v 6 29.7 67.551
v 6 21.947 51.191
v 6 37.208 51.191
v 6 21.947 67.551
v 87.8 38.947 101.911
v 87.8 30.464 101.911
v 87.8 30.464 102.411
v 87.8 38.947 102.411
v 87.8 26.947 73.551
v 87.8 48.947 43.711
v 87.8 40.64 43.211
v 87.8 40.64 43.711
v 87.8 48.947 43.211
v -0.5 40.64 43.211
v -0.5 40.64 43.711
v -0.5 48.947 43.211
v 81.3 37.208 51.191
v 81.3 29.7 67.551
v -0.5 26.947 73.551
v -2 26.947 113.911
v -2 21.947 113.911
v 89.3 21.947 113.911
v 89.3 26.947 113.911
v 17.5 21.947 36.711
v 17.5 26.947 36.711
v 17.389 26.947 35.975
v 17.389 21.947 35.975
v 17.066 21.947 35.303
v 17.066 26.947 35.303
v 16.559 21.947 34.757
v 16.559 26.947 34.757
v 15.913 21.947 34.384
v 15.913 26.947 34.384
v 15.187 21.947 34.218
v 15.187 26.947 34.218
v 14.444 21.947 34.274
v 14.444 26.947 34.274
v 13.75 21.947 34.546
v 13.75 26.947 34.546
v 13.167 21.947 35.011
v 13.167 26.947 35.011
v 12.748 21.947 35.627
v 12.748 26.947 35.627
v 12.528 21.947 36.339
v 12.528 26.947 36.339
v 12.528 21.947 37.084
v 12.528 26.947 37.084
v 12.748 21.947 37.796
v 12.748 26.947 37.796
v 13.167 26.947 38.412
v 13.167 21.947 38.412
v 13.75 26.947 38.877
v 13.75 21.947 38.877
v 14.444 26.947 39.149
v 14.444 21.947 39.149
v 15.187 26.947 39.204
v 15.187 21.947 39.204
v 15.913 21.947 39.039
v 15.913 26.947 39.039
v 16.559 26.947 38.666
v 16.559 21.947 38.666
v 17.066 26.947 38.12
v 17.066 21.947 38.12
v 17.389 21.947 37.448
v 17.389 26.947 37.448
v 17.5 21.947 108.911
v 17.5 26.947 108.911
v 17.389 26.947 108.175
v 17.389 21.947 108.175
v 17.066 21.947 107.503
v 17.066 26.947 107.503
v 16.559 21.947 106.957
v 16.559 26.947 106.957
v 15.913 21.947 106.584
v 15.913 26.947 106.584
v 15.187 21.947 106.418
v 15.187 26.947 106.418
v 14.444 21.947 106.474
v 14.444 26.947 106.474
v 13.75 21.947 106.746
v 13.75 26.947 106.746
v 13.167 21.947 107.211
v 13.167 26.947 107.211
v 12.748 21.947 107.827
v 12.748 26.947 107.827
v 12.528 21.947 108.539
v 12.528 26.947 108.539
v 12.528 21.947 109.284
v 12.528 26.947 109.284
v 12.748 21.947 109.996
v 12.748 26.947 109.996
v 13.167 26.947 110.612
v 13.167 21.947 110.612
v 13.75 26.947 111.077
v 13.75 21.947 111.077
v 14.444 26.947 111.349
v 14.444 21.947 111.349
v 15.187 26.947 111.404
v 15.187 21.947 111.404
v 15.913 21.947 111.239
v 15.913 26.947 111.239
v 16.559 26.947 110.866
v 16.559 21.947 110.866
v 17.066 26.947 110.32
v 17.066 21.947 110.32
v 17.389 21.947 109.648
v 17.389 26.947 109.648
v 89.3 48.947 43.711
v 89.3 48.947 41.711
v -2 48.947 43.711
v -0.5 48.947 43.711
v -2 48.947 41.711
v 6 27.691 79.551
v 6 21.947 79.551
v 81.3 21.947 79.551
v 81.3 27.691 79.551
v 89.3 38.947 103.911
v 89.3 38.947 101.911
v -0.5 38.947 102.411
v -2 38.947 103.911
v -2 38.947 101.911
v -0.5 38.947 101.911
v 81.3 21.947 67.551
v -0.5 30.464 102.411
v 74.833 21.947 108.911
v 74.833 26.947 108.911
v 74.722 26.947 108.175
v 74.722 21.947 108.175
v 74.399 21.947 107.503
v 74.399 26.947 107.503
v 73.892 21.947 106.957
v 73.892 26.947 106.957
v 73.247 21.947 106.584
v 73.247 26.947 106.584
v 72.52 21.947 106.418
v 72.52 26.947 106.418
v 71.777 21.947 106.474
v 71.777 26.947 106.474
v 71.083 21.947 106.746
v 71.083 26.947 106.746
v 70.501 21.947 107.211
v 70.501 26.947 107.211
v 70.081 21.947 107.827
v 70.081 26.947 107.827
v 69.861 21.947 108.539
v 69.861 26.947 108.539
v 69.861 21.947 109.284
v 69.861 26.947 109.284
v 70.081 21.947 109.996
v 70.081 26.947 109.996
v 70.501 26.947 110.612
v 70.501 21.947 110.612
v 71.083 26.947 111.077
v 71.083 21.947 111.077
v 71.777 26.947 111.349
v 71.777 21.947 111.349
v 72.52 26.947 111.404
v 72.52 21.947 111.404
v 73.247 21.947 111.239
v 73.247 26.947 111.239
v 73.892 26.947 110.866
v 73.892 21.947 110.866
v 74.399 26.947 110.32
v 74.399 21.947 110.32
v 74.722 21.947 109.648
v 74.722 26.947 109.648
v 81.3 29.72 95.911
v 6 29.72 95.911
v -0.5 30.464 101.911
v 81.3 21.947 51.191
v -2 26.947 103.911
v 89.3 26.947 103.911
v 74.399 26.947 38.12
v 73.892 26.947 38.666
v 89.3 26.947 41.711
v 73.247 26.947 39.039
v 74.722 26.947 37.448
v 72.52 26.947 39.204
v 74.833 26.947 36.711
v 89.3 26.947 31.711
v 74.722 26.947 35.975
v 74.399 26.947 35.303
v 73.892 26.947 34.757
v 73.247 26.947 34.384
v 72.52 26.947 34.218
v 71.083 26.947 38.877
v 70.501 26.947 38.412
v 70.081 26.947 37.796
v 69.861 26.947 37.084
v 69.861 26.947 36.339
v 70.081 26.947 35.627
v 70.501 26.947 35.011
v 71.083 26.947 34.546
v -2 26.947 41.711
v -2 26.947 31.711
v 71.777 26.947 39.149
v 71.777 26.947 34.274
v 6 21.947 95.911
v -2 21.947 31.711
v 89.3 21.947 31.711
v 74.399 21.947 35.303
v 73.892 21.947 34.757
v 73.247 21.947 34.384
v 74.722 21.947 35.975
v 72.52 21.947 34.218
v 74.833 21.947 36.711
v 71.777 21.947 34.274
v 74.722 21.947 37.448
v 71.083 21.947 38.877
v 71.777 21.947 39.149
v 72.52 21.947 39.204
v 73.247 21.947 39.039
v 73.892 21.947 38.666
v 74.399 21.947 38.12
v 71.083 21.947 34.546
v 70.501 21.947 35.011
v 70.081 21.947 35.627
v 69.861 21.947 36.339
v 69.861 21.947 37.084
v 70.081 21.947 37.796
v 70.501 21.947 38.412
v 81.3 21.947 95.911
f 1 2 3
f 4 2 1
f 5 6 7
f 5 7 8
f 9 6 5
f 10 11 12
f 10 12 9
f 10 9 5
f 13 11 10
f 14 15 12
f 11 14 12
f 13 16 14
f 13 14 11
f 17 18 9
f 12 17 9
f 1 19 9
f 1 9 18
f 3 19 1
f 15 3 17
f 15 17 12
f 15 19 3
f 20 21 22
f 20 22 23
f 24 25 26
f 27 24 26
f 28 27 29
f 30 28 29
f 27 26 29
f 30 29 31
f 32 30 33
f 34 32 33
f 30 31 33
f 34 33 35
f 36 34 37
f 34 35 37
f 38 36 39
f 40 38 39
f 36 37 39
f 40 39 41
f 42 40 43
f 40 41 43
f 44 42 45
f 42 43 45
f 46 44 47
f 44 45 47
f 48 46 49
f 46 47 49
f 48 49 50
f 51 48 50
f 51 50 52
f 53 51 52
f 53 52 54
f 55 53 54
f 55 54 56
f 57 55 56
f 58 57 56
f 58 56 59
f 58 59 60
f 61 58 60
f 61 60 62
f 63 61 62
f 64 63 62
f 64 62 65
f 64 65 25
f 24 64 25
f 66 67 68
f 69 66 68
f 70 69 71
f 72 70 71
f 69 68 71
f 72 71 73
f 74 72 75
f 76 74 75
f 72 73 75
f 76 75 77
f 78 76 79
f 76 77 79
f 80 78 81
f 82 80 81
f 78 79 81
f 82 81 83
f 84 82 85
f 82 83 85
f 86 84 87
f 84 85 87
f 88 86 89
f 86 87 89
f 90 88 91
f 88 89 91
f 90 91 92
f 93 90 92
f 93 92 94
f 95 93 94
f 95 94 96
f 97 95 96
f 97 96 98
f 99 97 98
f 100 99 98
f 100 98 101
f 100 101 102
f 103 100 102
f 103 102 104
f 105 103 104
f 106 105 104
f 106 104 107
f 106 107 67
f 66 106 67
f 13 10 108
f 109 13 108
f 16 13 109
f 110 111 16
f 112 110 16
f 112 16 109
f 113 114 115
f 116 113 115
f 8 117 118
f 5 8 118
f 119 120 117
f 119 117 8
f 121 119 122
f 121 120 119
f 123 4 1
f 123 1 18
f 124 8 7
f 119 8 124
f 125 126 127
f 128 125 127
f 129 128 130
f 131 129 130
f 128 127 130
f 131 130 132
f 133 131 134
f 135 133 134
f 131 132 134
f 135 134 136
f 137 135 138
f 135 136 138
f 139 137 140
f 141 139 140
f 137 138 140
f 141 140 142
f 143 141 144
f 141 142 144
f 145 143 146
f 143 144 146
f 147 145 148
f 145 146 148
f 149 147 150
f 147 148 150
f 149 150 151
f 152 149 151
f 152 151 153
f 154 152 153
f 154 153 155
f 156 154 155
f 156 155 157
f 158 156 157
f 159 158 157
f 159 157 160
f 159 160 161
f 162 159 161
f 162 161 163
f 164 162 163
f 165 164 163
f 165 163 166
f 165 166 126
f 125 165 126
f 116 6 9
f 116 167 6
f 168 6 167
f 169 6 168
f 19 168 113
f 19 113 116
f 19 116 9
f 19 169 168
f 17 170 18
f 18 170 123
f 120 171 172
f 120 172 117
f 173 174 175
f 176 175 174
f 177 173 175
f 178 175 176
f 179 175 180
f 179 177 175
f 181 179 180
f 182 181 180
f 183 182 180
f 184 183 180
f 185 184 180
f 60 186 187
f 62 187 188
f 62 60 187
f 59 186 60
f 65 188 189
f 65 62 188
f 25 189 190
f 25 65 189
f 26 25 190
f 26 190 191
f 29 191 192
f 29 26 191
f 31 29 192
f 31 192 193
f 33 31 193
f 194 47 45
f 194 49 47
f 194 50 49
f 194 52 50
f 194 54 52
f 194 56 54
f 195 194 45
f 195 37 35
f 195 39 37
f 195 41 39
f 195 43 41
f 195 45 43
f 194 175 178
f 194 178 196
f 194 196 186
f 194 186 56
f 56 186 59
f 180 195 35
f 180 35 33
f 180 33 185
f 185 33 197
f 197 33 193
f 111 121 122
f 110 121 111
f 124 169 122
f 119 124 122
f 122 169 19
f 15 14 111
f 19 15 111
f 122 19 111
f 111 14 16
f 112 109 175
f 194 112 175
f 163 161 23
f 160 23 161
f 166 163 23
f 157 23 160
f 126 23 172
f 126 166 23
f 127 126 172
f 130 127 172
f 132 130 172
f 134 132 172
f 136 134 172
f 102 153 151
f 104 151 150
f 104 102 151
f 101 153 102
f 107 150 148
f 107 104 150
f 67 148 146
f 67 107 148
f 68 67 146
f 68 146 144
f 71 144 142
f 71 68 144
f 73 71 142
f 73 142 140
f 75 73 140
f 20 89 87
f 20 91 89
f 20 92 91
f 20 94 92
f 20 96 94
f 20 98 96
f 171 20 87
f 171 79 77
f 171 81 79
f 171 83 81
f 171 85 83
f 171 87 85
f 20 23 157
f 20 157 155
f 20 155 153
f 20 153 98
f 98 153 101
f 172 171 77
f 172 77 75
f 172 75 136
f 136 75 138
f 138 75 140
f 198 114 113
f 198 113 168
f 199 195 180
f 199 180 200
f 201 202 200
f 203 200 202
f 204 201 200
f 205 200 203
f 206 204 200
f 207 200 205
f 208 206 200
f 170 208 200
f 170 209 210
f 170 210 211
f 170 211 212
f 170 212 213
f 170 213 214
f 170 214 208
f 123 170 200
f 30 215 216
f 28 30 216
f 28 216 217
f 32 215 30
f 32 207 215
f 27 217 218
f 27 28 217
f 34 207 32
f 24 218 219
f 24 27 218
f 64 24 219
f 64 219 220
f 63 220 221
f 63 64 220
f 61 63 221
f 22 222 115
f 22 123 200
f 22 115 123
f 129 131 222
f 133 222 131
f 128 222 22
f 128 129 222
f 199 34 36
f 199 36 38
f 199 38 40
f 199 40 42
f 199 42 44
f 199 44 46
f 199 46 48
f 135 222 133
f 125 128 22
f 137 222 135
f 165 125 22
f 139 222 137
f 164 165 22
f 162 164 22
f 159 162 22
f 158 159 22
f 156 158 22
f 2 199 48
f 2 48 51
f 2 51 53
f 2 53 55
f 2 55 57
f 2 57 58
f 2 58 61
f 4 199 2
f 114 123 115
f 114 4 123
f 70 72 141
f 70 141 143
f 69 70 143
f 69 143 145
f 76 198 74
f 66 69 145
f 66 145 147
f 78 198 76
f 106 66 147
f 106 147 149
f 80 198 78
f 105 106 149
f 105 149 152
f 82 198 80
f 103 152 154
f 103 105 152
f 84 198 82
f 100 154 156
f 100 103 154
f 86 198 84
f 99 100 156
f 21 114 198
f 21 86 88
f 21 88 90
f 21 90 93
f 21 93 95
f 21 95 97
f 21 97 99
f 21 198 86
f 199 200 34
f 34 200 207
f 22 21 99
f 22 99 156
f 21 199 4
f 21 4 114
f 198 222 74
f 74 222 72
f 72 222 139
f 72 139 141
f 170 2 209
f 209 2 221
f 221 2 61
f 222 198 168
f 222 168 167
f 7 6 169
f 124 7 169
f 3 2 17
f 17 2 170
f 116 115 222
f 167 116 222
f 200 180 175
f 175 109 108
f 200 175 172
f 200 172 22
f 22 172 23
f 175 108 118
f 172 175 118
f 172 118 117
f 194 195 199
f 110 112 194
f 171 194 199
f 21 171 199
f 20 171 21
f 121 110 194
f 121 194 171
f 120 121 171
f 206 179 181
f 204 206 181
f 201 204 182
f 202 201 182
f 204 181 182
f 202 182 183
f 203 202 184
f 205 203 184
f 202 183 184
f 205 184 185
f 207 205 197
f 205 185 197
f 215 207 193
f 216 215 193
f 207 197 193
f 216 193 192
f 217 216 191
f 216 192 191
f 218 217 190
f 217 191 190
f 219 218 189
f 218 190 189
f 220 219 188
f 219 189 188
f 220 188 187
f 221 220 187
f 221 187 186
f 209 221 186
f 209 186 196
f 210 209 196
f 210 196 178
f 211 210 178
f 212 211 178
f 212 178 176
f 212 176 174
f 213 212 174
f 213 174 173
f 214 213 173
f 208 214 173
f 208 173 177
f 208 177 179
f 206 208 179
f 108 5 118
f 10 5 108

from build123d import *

# Parameters (mm, degrees)
BOSS_EXTRUDE1_DEPTH  = 87.3
CUT_EXTRUDE1_REACH   = 7
SKETCH2_R            = 2.5
SKETCH3_W            = 75.3
SKETCH3_H            = 16.36
CUT_EXTRUDE2_DEPTH   = 19.693329973
SKETCH4_W            = 2
SKETCH4_H            = 12
SKETCH4_H_2          = 22
BOSS_EXTRUDE2_DEPTH  = 87.3
BOSS_EXTRUDE16_DEPTH = 2
LPATTERN1_COUNT      = 2
LPATTERN1_PITCH      = 89.3
CUT_EXTRUDE4_DEPTH   = 0.5
CUT_EXTRUDE5_DEPTH   = 0.5
SKETCH14_W           = 88.3
SKETCH14_H           = 8.306670027
CUT_EXTRUDE6_DEPTH   = 0.5
SKETCH15_W           = 88.3
SKETCH15_H           = 8.482653923
CUT_EXTRUDE7_DEPTH   = 0.5


with BuildPart() as part:
    # Sketch1 → Boss-Extrude1 (new body)
    with BuildSketch(Plane(origin=(0, 0, 0), x_dir=(0, 0, -1), z_dir=(1, 0, 0))):
        Polygon((-73.551459735, 26.94681652), (-43.711459735, 40.640146493), (-43.711459735, 26.94681652), (-31.711459735, 26.94681652), (-31.711459735, 21.94681652), (-113.911459735, 21.94681652), (-113.911459735, 26.94681652), (-101.911459735, 26.94681652), (-101.911459735, 30.464162597), align=None)
    extrude(amount=BOSS_EXTRUDE1_DEPTH)

    # Sketch2 → Cut-Extrude1 (cut, up to next)
    with BuildSketch(Plane(origin=(0, 26.94681652, 0), x_dir=(1, 0, 0), z_dir=(0, 1, 0)), mode=Mode.PRIVATE) as cut_extrude1_sk1:
        with Locations((15, -36.711459735)):
            Circle(SKETCH2_R)
    cut_extrude1_tool1 = extrude(cut_extrude1_sk1.sketch, amount=-CUT_EXTRUDE1_REACH, mode=Mode.PRIVATE) & part.part
    add(cut_extrude1_tool1.solids().sort_by_distance((15, 26.946817, 36.71146))[0], mode=Mode.SUBTRACT)
    # Sketch2 → Cut-Extrude1 (cut, up to next)
    with BuildSketch(Plane(origin=(0, 26.94681652, 0), x_dir=(1, 0, 0), z_dir=(0, 1, 0)), mode=Mode.PRIVATE) as cut_extrude1_sk2:
        with Locations((72.333370453, -36.711459735)):
            Circle(SKETCH2_R)
    cut_extrude1_tool2 = extrude(cut_extrude1_sk2.sketch, amount=-CUT_EXTRUDE1_REACH, mode=Mode.PRIVATE) & part.part
    add(cut_extrude1_tool2.solids().sort_by_distance((72.33337, 26.946817, 36.71146))[0], mode=Mode.SUBTRACT)
    # Sketch2 → Cut-Extrude1 (cut, up to next)
    with BuildSketch(Plane(origin=(0, 26.94681652, 0), x_dir=(1, 0, 0), z_dir=(0, 1, 0)), mode=Mode.PRIVATE) as cut_extrude1_sk3:
        with Locations((72.333370453, -108.911459735)):
            Circle(SKETCH2_R)
    cut_extrude1_tool3 = extrude(cut_extrude1_sk3.sketch, amount=-CUT_EXTRUDE1_REACH, mode=Mode.PRIVATE) & part.part
    add(cut_extrude1_tool3.solids().sort_by_distance((72.33337, 26.946817, 108.91146))[0], mode=Mode.SUBTRACT)
    # Sketch2 → Cut-Extrude1 (cut, up to next)
    with BuildSketch(Plane(origin=(0, 26.94681652, 0), x_dir=(1, 0, 0), z_dir=(0, 1, 0)), mode=Mode.PRIVATE) as cut_extrude1_sk4:
        with Locations((15, -108.911459735)):
            Circle(SKETCH2_R)
    cut_extrude1_tool4 = extrude(cut_extrude1_sk4.sketch, amount=-CUT_EXTRUDE1_REACH, mode=Mode.PRIVATE) & part.part
    add(cut_extrude1_tool4.solids().sort_by_distance((15, 26.946817, 108.91146))[0], mode=Mode.SUBTRACT)

    # Sketch3 → Cut-Extrude2 (cut, through all)
    with BuildSketch(Plane.XZ.offset(-21.94681652)):
        with Locations((43.65, 87.731459735)):
            Rectangle(SKETCH3_W, SKETCH3_H)
        with Locations((43.65, 59.371459735)):
            Rectangle(SKETCH3_W, SKETCH3_H)
    extrude(amount=-CUT_EXTRUDE2_DEPTH, mode=Mode.SUBTRACT)

    # Sketch4 → Boss-Extrude2 (add, through all)
    with BuildSketch(Plane(origin=(87.3, 0, 0), x_dir=(0, 0, -1), z_dir=(1, 0, 0))):
        with Locations((-102.911459735, 32.94681652)):
            Rectangle(SKETCH4_W, SKETCH4_H)
        with Locations((-42.711459735, 37.94681652)):
            Rectangle(SKETCH4_W, SKETCH4_H_2)
    extrude(amount=-BOSS_EXTRUDE2_DEPTH)

    # Sketch8 → Boss-Extrude16 (add)
    with BuildSketch(Plane(origin=(87.3, 0, 0), x_dir=(0, 0, -1), z_dir=(1, 0, 0))):
        Polygon((-103.911459735, 38.94681652), (-101.911459735, 38.94681652), (-43.711459735, 48.94681652), (-41.711459735, 48.94681652), (-41.711459735, 26.94681652), (-31.711459735, 26.94681652), (-31.711459735, 21.94681652), (-113.911459735, 21.94681652), (-113.911459735, 26.94681652), (-103.911459735, 26.94681652), align=None)
    boss_extrude16 = extrude(amount=BOSS_EXTRUDE16_DEPTH)

    # LPattern1: Boss-Extrude16 ×2
    with Locations(*[(-i * LPATTERN1_PITCH, 0, 0) for i in range(1, LPATTERN1_COUNT)]):
        add(boss_extrude16)

    # Sketch12 → Cut-Extrude4 (cut)
    with BuildSketch(Plane(origin=(0, 0, 0), x_dir=(0, 0, -1), z_dir=(1, 0, 0))):
        Polygon((-43.711459735, 48.94681652), (-43.711459735, 40.640146493), (-73.551459735, 26.94681652), (-101.911459735, 30.464162597), (-101.911459735, 38.94681652), align=None)
    extrude(amount=-CUT_EXTRUDE4_DEPTH, mode=Mode.SUBTRACT)

    # Sketch13 → Cut-Extrude5 (cut)
    with BuildSketch(Plane.ZY.offset(-87.3)):
        Polygon((43.711459735, 40.640146493), (43.711459735, 48.94681652), (101.911459735, 38.94681652), (101.911459735, 30.464162597), (73.551459735, 26.94681652), align=None)
    extrude(amount=-CUT_EXTRUDE5_DEPTH, mode=Mode.SUBTRACT)

    # Sketch14 → Cut-Extrude6 (cut)
    with BuildSketch(Plane.XY.offset(43.711459735)):
        with Locations((43.65, 44.793481507)):
            Rectangle(SKETCH14_W, SKETCH14_H)
    extrude(amount=-CUT_EXTRUDE6_DEPTH, mode=Mode.SUBTRACT)

    # Sketch15 → Cut-Extrude7 (cut)
    with BuildSketch(Plane(origin=(0, 0, 101.911459735), x_dir=(-1, 0, 0), z_dir=(0, 0, -1))):
        with Locations((-43.65, 34.705489559)):
            Rectangle(SKETCH15_W, SKETCH15_H)
    extrude(amount=-CUT_EXTRUDE7_DEPTH, mode=Mode.SUBTRACT)


solid = part.part
